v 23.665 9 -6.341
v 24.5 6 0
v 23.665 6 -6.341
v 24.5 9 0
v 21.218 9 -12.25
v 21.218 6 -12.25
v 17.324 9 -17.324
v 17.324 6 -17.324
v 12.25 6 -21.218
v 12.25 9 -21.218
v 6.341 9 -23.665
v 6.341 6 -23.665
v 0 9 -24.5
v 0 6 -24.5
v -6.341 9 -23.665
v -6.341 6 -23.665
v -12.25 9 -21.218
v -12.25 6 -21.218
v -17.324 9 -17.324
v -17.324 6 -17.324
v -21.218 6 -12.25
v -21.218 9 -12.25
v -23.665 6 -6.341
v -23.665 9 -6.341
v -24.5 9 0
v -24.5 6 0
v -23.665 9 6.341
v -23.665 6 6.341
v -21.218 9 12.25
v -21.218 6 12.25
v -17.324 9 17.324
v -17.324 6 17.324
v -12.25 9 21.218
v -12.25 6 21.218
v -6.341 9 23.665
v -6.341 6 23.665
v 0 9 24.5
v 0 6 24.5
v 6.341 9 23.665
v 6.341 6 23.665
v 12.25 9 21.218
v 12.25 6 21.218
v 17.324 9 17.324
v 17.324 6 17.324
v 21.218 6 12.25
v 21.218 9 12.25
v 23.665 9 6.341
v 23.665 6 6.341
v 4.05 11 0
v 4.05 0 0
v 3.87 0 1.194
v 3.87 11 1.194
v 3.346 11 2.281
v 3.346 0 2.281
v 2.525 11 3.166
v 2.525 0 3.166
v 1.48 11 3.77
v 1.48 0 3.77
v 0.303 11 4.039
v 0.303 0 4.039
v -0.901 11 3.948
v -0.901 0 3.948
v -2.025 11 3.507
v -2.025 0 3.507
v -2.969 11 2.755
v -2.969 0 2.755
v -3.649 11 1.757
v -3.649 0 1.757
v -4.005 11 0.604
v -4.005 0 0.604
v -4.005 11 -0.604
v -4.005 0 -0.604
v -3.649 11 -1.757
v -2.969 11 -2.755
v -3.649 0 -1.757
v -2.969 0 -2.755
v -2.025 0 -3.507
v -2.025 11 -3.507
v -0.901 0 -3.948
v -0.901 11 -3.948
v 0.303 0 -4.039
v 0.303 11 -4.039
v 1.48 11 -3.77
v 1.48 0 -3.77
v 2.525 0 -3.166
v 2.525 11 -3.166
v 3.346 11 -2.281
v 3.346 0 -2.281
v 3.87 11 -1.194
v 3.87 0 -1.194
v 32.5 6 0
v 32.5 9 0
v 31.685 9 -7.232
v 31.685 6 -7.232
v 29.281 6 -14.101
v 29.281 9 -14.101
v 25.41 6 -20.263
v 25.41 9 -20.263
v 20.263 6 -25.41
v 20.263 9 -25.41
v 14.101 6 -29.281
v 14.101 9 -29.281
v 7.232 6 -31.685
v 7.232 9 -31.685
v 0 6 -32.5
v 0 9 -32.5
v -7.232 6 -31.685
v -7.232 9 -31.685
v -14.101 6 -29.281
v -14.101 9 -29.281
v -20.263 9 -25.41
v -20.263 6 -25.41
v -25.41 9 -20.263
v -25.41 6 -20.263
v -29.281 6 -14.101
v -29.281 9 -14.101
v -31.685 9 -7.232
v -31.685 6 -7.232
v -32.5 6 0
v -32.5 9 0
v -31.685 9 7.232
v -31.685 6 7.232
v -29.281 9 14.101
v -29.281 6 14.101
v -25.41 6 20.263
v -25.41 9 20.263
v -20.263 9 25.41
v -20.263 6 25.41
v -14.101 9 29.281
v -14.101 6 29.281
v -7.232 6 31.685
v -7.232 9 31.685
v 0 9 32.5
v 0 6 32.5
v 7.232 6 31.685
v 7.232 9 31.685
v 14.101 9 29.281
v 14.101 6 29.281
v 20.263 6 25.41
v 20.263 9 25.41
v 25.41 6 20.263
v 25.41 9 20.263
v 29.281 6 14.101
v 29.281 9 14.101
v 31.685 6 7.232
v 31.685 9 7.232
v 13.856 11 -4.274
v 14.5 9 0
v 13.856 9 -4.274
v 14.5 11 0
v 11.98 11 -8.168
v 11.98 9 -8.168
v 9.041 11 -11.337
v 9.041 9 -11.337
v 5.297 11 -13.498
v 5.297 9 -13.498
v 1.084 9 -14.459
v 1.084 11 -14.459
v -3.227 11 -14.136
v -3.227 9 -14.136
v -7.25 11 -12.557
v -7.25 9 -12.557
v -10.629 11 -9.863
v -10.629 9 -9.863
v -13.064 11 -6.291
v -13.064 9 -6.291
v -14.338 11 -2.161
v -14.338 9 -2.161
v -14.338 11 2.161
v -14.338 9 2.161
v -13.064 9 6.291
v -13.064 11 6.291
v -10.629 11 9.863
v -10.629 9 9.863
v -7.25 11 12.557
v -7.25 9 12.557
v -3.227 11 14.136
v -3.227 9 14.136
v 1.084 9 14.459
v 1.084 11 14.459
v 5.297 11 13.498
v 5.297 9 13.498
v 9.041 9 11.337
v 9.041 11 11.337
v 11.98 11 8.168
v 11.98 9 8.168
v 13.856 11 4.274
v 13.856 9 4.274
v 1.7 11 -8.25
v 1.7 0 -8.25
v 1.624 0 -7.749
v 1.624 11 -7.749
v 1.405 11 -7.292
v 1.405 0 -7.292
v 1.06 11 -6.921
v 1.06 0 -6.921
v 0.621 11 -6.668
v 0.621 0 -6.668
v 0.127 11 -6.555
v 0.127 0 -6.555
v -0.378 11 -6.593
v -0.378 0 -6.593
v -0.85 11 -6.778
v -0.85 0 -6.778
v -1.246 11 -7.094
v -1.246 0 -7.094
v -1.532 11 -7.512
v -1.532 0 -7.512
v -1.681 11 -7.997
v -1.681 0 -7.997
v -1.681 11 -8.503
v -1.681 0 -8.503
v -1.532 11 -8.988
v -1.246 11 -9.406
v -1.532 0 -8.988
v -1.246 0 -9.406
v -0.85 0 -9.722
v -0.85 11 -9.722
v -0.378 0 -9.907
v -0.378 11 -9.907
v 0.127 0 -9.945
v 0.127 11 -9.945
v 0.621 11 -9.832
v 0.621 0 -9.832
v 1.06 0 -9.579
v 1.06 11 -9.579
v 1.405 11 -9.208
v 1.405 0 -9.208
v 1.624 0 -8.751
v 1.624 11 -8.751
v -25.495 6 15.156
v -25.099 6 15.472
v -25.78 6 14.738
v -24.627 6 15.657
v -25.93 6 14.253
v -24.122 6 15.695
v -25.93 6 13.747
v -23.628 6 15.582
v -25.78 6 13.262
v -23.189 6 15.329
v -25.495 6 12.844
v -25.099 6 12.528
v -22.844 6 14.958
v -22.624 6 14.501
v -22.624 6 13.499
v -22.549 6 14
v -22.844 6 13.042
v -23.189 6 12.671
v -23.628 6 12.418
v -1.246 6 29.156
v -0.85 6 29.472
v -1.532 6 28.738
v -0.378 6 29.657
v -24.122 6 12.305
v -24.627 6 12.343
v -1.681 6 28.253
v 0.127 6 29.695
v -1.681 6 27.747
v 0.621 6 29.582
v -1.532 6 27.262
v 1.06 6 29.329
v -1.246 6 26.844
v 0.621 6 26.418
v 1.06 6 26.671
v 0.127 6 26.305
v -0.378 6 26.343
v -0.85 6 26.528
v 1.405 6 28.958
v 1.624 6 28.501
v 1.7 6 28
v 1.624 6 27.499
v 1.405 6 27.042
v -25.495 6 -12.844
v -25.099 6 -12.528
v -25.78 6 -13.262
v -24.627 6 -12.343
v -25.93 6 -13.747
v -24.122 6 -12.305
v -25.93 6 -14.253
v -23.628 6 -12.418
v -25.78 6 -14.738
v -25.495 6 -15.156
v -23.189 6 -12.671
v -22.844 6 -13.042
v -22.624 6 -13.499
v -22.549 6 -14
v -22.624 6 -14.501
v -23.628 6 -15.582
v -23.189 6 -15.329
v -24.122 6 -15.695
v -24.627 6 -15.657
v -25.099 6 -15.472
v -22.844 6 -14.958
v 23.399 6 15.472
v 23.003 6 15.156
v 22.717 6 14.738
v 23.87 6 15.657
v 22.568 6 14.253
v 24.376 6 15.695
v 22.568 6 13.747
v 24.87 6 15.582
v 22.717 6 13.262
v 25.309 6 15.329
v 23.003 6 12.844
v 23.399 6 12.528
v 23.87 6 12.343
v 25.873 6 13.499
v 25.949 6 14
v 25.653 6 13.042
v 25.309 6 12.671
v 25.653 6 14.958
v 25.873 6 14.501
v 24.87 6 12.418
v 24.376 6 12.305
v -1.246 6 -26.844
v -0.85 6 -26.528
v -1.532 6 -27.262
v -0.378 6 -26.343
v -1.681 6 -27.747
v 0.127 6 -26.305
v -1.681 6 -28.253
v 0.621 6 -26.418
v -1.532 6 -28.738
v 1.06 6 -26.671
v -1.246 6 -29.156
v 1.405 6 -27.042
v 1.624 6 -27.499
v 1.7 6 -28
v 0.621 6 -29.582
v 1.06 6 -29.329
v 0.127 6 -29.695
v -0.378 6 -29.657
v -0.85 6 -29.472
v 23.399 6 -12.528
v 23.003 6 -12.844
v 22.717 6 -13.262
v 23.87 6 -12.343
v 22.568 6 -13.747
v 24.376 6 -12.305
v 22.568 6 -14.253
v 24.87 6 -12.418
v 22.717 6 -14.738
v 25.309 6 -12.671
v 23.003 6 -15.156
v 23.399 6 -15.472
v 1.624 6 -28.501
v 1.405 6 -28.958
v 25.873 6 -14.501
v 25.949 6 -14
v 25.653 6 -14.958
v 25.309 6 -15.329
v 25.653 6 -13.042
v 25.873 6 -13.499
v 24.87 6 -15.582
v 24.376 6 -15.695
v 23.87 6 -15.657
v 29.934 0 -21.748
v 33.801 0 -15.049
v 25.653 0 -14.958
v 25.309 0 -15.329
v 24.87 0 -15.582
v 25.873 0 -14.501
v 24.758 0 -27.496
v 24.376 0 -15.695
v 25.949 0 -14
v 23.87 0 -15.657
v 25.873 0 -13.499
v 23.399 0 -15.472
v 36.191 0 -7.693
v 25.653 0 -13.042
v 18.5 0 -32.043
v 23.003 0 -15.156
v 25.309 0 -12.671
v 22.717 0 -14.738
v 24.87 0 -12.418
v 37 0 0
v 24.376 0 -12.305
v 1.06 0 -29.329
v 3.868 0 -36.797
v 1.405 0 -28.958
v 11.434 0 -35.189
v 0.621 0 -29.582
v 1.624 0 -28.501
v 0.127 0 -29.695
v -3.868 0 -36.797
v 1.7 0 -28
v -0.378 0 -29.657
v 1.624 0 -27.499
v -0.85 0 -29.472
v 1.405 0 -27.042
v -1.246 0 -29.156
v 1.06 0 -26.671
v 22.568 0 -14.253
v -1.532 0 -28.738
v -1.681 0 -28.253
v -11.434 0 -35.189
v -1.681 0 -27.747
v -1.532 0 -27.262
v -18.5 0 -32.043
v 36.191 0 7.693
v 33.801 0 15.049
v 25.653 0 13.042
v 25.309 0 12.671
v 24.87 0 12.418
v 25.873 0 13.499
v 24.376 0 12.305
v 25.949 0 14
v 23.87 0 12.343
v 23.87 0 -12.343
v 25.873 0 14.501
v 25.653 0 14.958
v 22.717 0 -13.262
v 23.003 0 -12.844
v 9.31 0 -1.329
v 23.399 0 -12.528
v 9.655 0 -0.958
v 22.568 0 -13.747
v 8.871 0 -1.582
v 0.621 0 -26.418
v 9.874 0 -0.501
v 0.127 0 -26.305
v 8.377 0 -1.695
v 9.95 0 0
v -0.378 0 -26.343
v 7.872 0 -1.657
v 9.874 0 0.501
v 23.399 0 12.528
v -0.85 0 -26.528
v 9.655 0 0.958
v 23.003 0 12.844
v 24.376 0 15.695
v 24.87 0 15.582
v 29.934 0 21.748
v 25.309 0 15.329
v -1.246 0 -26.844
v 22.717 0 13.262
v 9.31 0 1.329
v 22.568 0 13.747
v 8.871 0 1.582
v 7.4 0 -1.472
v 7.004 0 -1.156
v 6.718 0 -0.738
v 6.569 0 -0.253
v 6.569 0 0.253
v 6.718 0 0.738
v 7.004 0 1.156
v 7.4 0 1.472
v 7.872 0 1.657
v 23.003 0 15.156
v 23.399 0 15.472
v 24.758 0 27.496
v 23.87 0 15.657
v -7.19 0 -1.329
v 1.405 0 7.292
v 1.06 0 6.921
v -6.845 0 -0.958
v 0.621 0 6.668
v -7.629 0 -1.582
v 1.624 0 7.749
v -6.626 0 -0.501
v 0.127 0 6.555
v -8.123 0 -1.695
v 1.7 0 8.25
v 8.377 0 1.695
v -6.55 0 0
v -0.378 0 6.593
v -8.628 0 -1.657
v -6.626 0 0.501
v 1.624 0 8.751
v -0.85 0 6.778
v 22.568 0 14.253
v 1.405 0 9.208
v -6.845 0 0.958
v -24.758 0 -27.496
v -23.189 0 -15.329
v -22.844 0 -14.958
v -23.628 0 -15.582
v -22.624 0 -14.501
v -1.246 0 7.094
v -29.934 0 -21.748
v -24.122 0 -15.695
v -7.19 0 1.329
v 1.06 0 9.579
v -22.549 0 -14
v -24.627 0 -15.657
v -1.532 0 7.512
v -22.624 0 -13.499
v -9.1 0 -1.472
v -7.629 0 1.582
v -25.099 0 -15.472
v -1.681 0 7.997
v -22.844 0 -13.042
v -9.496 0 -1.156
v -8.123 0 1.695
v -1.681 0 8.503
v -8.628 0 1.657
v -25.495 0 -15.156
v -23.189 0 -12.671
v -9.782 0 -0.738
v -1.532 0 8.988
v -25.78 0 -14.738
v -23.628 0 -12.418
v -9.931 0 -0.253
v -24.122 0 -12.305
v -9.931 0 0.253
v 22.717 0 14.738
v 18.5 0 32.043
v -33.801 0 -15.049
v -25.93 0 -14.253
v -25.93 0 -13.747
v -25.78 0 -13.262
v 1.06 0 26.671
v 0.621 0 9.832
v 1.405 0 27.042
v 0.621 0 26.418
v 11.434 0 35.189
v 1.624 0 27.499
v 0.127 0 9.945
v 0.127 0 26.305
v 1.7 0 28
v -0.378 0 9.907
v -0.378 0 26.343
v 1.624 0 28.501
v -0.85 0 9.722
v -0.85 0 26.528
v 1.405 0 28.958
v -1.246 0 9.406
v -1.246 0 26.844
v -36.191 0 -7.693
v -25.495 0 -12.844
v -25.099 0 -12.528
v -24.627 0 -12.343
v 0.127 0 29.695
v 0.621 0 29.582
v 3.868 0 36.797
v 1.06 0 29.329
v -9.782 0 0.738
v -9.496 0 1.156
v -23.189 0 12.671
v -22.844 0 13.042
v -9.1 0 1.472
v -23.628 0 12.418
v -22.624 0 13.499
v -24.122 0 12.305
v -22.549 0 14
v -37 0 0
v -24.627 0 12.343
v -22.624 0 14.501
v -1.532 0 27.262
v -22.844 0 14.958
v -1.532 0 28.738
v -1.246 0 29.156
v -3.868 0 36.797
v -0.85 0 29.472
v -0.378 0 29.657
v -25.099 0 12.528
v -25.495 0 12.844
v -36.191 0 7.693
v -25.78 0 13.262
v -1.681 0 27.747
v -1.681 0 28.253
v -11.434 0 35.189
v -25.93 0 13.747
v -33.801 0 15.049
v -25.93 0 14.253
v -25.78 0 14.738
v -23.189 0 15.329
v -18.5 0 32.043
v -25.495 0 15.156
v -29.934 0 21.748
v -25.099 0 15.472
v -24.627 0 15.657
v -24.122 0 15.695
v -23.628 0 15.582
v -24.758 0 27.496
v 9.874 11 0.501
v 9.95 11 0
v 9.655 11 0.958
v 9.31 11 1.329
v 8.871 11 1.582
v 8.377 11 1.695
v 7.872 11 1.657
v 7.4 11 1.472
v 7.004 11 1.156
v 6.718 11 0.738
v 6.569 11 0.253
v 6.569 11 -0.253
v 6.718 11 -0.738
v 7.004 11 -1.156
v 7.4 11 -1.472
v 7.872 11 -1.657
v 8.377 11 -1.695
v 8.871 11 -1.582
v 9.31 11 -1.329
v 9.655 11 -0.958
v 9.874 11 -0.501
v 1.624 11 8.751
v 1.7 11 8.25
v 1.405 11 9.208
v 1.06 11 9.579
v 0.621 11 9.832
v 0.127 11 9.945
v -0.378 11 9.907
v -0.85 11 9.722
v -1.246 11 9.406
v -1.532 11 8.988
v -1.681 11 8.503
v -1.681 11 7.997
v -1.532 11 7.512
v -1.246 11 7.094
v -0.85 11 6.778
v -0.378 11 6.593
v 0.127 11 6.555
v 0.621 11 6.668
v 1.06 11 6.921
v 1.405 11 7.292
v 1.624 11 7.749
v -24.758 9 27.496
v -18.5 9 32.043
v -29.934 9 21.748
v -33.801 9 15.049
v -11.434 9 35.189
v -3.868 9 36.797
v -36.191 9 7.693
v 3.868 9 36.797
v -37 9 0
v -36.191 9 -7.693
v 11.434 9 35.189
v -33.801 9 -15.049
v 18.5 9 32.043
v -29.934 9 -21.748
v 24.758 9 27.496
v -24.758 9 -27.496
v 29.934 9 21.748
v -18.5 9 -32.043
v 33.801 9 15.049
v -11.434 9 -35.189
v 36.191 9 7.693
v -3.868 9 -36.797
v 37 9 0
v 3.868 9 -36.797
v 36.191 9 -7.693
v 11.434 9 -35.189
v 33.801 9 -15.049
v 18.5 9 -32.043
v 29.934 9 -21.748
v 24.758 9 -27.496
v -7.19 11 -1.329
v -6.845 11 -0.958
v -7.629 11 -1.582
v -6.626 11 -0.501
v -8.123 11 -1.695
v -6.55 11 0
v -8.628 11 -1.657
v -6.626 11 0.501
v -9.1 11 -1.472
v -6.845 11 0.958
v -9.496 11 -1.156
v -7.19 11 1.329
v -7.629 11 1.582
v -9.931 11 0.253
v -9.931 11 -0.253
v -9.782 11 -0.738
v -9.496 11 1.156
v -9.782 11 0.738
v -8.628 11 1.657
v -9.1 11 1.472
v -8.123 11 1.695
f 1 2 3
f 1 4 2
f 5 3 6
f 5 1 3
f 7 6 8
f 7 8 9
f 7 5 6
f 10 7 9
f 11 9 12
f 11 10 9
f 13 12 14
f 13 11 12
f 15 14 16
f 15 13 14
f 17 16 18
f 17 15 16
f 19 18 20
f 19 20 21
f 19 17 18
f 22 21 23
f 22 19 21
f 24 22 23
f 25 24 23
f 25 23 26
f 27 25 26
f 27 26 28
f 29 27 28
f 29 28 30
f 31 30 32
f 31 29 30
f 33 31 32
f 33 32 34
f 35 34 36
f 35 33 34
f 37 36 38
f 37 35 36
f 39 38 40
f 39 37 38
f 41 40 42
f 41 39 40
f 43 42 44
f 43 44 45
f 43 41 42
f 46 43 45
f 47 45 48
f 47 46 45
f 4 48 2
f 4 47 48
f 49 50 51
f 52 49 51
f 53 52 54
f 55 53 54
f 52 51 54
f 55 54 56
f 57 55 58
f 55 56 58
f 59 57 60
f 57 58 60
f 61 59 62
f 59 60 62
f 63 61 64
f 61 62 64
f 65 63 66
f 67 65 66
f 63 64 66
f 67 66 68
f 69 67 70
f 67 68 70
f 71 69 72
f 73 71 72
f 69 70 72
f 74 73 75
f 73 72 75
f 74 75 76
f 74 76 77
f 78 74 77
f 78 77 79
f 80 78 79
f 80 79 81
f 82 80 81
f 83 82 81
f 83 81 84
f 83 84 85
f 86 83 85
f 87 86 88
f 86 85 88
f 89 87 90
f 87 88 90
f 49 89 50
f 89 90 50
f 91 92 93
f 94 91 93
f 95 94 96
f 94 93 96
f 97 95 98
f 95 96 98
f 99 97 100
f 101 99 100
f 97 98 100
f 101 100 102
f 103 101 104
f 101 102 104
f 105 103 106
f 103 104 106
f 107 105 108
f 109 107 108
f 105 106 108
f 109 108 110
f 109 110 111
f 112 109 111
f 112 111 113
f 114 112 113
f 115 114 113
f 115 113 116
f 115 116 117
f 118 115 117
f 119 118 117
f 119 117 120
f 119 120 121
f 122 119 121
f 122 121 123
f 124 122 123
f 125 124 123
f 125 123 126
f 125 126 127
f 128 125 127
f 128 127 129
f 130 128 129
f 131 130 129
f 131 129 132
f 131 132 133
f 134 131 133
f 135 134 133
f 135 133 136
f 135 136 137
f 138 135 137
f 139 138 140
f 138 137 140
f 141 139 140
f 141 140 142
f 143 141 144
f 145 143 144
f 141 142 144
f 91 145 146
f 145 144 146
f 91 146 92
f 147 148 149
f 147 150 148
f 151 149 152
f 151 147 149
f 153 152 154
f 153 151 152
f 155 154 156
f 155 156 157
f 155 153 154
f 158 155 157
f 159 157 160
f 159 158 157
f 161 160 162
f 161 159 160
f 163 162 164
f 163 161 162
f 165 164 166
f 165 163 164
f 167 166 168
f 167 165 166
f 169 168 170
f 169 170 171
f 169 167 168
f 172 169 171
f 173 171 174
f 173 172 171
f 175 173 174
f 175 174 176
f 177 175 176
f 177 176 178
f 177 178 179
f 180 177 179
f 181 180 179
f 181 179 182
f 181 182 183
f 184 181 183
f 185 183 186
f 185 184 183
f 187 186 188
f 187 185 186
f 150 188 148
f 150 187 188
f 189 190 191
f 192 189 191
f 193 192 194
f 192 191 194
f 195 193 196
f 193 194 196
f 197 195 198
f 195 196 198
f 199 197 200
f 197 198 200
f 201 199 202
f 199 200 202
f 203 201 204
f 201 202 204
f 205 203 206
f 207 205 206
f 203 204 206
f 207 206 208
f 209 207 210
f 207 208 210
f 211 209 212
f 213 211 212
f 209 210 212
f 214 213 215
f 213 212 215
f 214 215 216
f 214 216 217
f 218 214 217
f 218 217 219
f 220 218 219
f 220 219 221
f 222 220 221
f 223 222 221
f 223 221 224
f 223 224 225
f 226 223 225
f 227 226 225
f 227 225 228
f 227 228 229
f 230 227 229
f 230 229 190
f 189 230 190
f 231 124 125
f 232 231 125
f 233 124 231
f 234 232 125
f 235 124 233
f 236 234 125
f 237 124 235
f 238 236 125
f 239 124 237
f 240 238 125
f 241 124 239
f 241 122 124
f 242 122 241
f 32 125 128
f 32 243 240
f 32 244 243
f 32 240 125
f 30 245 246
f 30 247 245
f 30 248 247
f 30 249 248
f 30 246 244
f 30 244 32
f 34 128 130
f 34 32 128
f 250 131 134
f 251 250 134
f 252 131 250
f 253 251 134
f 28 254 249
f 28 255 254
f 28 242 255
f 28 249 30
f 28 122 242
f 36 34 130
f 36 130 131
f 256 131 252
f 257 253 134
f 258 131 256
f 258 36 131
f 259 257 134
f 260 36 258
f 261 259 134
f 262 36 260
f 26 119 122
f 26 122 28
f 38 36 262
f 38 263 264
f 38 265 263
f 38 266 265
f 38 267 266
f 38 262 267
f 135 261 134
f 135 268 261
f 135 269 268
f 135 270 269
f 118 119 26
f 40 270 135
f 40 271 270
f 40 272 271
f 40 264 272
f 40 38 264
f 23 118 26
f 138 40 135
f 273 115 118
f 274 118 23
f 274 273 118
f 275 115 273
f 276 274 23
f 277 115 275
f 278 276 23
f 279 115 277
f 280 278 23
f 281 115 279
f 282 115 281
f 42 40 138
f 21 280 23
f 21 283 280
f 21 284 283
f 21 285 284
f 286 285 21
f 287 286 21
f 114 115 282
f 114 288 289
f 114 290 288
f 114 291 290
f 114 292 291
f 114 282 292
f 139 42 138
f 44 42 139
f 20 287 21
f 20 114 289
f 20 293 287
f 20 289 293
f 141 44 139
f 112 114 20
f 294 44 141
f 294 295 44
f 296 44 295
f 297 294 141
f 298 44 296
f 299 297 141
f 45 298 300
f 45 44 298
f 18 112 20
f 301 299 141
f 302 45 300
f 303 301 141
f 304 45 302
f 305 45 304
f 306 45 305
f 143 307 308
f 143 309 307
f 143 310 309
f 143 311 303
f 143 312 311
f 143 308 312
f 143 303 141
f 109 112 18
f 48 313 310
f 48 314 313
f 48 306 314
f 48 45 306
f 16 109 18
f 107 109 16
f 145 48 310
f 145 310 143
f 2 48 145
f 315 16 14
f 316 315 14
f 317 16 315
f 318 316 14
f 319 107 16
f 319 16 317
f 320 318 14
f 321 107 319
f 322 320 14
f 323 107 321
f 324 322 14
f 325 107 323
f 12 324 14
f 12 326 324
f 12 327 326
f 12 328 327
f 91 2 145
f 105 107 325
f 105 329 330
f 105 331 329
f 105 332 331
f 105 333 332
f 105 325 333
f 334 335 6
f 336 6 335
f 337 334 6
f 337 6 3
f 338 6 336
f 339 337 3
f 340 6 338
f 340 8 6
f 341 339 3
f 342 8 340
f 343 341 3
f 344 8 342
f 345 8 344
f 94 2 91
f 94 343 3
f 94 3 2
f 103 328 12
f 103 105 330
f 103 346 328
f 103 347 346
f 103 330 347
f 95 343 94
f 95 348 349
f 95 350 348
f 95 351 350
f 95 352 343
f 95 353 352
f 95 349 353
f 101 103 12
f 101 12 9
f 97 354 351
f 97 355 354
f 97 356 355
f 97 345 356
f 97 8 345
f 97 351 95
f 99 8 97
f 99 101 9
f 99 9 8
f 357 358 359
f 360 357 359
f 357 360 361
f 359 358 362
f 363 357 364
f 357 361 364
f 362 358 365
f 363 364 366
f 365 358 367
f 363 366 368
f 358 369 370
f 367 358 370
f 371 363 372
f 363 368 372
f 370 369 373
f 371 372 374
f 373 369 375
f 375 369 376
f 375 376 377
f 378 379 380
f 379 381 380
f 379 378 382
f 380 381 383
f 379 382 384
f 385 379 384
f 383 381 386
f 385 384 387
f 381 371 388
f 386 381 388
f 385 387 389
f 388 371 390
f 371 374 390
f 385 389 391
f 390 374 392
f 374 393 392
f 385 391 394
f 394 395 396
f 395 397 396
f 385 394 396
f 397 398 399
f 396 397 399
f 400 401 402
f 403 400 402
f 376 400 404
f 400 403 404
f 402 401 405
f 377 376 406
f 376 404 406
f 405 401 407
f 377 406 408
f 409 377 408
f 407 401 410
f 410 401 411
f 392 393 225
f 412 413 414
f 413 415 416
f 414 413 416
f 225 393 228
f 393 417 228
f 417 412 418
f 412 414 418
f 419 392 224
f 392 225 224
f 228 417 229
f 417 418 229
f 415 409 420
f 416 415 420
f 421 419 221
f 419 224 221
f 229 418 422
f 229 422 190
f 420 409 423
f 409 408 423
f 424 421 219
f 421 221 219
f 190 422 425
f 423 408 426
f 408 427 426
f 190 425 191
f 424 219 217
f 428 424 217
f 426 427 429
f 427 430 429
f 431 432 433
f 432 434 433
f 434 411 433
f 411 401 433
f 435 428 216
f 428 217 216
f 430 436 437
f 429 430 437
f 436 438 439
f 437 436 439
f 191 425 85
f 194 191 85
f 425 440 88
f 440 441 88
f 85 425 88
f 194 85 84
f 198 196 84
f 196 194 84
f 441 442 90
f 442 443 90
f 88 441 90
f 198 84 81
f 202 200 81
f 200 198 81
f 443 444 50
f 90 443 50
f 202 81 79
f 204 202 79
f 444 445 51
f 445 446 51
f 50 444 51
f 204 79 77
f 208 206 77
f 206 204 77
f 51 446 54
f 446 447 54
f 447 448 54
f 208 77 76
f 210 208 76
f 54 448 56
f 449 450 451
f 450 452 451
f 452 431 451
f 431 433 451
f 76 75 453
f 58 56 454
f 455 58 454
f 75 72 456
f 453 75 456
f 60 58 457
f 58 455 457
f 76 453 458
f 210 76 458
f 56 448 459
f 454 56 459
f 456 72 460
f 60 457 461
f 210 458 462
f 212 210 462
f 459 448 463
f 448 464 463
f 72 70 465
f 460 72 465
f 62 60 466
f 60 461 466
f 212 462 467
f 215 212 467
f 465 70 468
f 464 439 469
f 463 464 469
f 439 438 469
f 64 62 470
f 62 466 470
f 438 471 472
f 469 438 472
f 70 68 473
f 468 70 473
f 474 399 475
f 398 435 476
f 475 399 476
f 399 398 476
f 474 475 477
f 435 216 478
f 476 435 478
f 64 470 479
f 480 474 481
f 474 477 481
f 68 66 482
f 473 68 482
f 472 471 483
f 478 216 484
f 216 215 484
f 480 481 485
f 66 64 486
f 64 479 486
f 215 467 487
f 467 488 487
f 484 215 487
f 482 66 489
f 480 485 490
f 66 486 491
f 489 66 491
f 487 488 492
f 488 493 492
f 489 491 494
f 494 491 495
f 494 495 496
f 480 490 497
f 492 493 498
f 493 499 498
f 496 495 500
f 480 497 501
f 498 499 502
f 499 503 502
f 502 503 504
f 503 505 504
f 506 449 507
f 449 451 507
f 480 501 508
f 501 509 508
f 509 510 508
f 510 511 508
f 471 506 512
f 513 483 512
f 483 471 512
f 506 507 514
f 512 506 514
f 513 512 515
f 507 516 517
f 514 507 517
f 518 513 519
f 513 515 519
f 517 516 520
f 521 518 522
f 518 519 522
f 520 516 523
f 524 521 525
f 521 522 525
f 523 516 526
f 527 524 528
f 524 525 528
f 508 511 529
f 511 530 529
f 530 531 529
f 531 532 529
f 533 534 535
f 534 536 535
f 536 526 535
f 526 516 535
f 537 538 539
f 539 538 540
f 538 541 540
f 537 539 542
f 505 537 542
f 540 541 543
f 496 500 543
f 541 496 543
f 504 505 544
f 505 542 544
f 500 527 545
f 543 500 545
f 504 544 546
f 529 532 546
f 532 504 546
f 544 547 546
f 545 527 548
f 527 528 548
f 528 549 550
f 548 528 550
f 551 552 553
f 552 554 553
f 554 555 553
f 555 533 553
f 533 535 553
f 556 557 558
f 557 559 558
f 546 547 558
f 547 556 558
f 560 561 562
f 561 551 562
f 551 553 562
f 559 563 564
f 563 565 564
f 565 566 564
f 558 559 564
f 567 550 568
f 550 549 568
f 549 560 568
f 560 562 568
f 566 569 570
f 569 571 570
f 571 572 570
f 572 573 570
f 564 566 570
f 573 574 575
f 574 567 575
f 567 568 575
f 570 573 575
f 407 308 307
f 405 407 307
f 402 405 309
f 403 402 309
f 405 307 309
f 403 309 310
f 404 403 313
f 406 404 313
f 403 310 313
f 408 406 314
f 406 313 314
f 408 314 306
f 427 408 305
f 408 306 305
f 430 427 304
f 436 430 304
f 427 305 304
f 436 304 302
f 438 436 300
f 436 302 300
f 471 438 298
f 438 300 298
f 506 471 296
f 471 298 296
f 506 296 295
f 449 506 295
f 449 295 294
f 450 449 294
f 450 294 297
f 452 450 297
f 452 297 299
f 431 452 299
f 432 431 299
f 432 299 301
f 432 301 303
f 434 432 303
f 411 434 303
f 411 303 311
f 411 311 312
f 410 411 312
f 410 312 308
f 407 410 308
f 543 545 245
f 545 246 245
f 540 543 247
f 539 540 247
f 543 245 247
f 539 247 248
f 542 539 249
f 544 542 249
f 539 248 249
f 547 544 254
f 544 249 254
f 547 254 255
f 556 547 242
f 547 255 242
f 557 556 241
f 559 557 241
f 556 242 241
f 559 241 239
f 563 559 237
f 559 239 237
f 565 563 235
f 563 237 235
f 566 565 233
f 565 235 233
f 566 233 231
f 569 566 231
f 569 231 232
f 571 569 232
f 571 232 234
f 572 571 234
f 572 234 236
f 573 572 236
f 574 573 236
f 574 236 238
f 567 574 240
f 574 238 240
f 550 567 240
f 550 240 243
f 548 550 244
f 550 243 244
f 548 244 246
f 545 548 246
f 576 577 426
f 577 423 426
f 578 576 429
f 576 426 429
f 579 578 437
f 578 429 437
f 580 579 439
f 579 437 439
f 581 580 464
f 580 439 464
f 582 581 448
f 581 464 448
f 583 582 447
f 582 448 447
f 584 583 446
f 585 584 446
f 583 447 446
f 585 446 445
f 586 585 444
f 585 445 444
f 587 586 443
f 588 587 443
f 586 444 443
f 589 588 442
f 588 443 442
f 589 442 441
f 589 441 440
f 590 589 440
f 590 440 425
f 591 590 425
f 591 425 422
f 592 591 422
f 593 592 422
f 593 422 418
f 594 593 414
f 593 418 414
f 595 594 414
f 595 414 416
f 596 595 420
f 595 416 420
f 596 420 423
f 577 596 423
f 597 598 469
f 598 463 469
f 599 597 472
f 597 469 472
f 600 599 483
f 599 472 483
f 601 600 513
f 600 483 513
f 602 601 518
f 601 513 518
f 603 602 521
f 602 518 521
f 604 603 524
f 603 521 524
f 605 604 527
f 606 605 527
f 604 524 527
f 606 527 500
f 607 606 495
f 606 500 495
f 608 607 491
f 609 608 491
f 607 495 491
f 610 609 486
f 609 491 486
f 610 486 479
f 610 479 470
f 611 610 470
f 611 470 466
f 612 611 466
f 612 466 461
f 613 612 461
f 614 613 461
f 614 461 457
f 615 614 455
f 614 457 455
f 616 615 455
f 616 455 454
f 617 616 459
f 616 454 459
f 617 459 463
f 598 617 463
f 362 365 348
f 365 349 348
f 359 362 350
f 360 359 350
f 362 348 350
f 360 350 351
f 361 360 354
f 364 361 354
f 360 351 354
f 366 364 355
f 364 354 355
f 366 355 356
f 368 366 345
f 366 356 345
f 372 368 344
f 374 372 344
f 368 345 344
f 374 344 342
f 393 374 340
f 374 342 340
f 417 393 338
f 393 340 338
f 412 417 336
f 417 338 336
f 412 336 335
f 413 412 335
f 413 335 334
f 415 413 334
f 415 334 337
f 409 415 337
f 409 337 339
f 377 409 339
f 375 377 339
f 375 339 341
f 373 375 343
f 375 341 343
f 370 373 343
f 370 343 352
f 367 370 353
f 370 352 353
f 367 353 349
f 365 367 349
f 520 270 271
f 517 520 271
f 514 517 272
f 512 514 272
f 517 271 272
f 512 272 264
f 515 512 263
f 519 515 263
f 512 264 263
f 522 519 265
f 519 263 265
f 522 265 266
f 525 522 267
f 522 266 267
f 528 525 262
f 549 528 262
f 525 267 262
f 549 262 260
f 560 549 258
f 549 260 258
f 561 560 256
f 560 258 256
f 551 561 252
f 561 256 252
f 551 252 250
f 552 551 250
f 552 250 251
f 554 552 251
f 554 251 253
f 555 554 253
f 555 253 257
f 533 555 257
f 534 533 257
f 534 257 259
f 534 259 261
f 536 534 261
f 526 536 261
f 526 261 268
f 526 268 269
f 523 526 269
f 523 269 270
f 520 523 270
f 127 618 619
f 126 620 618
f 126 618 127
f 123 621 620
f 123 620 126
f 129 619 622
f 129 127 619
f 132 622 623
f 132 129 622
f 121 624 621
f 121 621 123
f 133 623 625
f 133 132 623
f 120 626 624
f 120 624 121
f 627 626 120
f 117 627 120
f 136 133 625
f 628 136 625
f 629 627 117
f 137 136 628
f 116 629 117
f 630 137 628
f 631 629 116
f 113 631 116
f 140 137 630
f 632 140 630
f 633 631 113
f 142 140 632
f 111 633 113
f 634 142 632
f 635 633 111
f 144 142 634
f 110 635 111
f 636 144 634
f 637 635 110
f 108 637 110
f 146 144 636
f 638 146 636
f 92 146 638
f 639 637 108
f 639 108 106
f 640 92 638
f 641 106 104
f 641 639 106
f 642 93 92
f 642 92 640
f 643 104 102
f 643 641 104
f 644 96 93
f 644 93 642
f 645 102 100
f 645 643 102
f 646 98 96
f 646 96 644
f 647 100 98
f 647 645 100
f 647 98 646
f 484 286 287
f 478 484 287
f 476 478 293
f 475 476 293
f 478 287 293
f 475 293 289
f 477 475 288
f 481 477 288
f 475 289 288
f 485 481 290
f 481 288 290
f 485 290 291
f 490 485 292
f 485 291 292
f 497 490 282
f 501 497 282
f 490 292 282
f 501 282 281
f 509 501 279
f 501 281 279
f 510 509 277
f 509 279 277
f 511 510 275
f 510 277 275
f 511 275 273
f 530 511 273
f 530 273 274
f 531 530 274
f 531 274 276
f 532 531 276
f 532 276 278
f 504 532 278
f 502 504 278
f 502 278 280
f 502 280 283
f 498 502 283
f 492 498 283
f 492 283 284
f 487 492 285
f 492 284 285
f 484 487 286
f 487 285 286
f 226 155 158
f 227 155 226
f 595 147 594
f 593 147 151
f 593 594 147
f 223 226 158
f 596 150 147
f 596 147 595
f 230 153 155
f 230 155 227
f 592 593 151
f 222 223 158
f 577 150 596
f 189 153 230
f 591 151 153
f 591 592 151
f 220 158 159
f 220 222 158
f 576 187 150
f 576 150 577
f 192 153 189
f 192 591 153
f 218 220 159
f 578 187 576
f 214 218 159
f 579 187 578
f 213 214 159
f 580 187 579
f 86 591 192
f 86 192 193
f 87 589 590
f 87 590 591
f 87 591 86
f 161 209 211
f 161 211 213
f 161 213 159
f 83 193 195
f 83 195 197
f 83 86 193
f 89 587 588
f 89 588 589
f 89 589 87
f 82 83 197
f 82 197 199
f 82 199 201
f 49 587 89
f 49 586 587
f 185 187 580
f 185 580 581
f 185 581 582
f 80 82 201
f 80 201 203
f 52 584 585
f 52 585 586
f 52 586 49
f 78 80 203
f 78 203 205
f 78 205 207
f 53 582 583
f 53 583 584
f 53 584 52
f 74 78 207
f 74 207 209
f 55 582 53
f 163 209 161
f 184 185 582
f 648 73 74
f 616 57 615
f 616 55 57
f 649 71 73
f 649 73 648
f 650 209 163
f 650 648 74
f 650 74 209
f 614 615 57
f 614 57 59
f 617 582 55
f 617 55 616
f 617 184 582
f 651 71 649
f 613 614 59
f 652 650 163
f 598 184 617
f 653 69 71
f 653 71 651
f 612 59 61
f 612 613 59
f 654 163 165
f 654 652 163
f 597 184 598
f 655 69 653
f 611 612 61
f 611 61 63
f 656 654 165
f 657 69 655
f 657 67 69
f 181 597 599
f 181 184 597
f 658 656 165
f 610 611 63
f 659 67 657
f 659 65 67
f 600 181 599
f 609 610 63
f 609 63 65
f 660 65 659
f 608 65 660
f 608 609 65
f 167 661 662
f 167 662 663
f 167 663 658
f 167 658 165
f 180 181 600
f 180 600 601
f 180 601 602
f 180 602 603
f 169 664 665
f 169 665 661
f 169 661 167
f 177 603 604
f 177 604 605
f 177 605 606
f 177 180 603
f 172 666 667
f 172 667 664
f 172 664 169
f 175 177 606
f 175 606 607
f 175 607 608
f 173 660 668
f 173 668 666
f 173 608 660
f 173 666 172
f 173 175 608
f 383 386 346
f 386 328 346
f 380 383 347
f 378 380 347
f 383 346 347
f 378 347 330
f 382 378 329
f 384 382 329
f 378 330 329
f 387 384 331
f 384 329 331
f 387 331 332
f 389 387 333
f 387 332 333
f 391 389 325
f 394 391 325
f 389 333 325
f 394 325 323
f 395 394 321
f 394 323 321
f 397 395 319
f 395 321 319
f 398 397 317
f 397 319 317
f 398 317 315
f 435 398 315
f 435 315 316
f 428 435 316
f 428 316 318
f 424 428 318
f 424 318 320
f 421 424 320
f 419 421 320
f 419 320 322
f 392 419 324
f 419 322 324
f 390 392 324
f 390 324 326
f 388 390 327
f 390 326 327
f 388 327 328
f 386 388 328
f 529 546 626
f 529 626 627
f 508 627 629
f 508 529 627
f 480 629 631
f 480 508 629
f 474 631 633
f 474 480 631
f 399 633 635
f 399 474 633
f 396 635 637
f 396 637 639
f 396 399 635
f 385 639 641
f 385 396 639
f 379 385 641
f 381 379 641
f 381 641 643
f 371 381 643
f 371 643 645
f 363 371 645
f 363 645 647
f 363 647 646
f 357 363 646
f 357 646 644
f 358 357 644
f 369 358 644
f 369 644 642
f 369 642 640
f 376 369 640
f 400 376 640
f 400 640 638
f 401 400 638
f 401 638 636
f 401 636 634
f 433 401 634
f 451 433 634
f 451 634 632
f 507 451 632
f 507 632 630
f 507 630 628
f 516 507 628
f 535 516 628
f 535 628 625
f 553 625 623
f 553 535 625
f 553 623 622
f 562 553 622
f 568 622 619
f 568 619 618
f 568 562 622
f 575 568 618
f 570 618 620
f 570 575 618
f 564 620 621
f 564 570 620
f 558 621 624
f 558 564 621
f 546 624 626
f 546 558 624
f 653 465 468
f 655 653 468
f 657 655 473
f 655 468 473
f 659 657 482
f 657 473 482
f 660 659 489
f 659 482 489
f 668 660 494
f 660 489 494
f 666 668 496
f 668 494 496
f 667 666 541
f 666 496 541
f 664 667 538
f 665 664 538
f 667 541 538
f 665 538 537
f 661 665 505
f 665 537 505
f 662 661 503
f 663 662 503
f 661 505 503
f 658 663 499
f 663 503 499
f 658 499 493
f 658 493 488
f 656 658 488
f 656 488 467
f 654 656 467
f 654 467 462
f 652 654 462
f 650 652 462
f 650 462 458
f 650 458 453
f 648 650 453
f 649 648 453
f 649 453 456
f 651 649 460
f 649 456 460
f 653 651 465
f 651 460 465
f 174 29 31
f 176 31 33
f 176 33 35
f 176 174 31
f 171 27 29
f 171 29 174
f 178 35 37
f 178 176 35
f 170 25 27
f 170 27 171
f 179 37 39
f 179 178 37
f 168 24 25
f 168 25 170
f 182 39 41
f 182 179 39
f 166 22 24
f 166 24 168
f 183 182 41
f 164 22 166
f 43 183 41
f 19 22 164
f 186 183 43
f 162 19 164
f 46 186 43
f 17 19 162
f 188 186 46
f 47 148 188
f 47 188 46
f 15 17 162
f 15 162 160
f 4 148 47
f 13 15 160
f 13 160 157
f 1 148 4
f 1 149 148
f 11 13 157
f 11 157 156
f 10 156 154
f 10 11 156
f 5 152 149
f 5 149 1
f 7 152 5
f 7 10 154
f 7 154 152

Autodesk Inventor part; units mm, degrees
ref_plane "YZ Plane" through (0, 0, 0) normal (1, 0, 0) x (0, 1, 0)
ref_plane "XZ Plane" through (0, 0, 0) normal (0, 1, 0) x (-1, 0, 0)
ref_plane "XY Plane" through (0, 0, 0) normal (0, 0, 1) x (1, 0, 0)
sketch "Boceto1" plane through (0, 0, 0) normal (0, 1, 0) x (-1, 0, 0)
  circle A0 centre (0, 0) radius 37
  dimension "d0" = 74
extrude "Extrusión1" add sketch "Boceto1" along normal blind 11
sketch "Boceto3" plane through (0, 0, 0) normal (0, -1, 0) x (1, 0, 0)
  circle A0 centre (0, 0) radius 8.25
  circle A1 centre (0, 8.25) radius 1.7
  circle A2 centre (8.25, 0) radius 1.7
  circle A3 centre (-8.25, 0) radius 1.7
  circle A4 centre (0, -8.25) radius 1.7
  dimension "d7" = 3.4
  dimension "d8" = 16.5
extrude "Extrusión3" cut sketch "Boceto3" against normal through all contours A0 A2 | A0 A2 | A1 A0 | A0 A1 | A4 A0 | A0 A4 | A3 A0 | A0 A3
sketch "Boceto5" plane through (0, 0, 0) normal (0, -1, 0) x (1, 0, 0)
  circle A0 centre (0, 0) radius 4.05
  dimension "d13" = 8.1
extrude "Extrusión5" cut sketch "Boceto5" against normal through all
sketch "Boceto8" plane through (0, 11, 0) normal (0, 1, 0) x (1, 0, 0)
  circle A0 centre (0, 0) radius 24.5
  circle A1 centre (0, 0) radius 37
  dimension "d25" = 49
  dimension "d26" = 74
extrude "Extrusión8" cut sketch "Boceto8" against normal blind 2
sketch "Boceto14" plane through (0, 9, 0) normal (0, 1, 0) x (1, 0, 0)
  circle A0 centre (0, 0) radius 28
  circle A1 centre (0, 28) radius 1.7
  circle A2 centre (-24.2487, 14) radius 1.7
  circle A3 centre (-24.2487, -14) radius 1.7
  circle A4 centre (0, -28) radius 1.7
  circle A5 centre (24.2487, -14) radius 1.7
  circle A6 centre (24.2487, 14) radius 1.7
  point P0 (-1.6992, -27.9484)
  point P1 (1.6992, -27.9484)
  dimension "d50" = 56
  dimension "d51" = 3.4
  dimension "d54" = 360
extrude "Extrusión12" cut sketch "Boceto14" against normal through all contours A6 A0 | A0 A6 | A5 A0 | A0 A5 | A1 A0 | A0 A1 | A4 A0 | A0 A4 | A2 A0 | A0 A2 | A3 A0 | A0 A3
sketch "Boceto15" plane through (0, 9, 0) normal (0, 1, 0) x (1, 0, 0)
  circle A0 centre (24.2487, 14) radius 1.7 projected
  circle A1 centre (24.2487, 14) radius 3
  circle A2 centre (0, 28) radius 3
  circle A3 centre (-24.2487, 14) radius 3
  circle A4 centre (-24.2487, -14) radius 3
  circle A5 centre (0, -28) radius 3
  circle A6 centre (24.2487, -14) radius 3
  circle A7 centre (0, 0) radius 4.05 projected
  circle A8 centre (0, 0) radius 32.5
  circle A9 centre (0, 0) radius 24.5
  dimension "d58" = 6
  dimension "d61" = 360
  dimension "d63" = 65
extrude "Extrusión13" cut sketch "Boceto15" against normal blind 3 contours A0 | A1 | A2 | A3 | A4 | A5 | A6 | A8
sketch "Boceto16" plane through (0, 11, 0) normal (0, 1, 0) x (1, 0, 0)
  circle A0 centre (0, 0) radius 14.5
  circle A1 centre (0, 0) radius 37
  dimension "d66" = 29
extrude "Extrusión14" cut sketch "Boceto16" against normal blind 2
equation "\"d1\" = Altura"
equation "\"Altura\" = 11"
properties part number "Joint - Primer segmento" material "Plastico PETG"
